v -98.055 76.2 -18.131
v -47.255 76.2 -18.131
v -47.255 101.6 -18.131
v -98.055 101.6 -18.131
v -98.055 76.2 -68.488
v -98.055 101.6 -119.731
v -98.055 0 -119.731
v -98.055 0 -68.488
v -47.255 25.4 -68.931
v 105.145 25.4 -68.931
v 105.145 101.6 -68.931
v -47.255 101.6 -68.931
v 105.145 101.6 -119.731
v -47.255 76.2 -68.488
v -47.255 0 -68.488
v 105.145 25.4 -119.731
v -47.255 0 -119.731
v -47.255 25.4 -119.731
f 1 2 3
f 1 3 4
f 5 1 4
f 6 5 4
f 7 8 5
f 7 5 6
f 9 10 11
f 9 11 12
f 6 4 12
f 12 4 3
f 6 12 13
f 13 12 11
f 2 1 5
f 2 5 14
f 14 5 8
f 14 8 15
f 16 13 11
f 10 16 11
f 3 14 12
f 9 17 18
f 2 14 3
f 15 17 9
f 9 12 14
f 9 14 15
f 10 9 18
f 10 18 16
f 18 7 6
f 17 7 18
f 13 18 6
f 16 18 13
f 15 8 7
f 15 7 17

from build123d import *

# Parameters (mm, degrees)
F0_W     = 152.3603492588
F0_H     = 50.8
F1_DEPTH = 101.6
F2_W     = 152.4
F2_H     = 50.8
F3_DEPTH = 25.4
F4_W     = 50.8
F4_H     = 50.8
F5_DEPTH = 76.2


with BuildPart() as f1:
    # F0 (on Front) → F1 (new body)
    with BuildSketch(Plane.XZ):
        Polygon((-47.2552540332, -18.1309473828), (-98.0552540332, -18.1309473828), (-98.0552540332, -119.7309473828), (-47.215603292, -119.7309473828), (-47.215603292, -68.9309473828), (-47.2552540332, -68.9309473828), align=None)
        with Locations((28.9645713374, -94.3309473828)):
            Rectangle(F0_W, F0_H)
    extrude(amount=-F1_DEPTH)

    # F2 (on Front) → F3 (cut)
    with BuildSketch(Plane.XZ):
        with Locations((28.9447459668, -94.3309473828)):
            Rectangle(F2_W, F2_H)
    extrude(amount=-F3_DEPTH, mode=Mode.SUBTRACT)

    # F4 (on Front) → F5 (cut)
    with BuildSketch(Plane.XZ):
        with Locations((-72.6552540332, -43.0878863094)):
            Rectangle(F4_W, F4_H)
    extrude(amount=-F5_DEPTH, mode=Mode.SUBTRACT)


solid = f1.part
